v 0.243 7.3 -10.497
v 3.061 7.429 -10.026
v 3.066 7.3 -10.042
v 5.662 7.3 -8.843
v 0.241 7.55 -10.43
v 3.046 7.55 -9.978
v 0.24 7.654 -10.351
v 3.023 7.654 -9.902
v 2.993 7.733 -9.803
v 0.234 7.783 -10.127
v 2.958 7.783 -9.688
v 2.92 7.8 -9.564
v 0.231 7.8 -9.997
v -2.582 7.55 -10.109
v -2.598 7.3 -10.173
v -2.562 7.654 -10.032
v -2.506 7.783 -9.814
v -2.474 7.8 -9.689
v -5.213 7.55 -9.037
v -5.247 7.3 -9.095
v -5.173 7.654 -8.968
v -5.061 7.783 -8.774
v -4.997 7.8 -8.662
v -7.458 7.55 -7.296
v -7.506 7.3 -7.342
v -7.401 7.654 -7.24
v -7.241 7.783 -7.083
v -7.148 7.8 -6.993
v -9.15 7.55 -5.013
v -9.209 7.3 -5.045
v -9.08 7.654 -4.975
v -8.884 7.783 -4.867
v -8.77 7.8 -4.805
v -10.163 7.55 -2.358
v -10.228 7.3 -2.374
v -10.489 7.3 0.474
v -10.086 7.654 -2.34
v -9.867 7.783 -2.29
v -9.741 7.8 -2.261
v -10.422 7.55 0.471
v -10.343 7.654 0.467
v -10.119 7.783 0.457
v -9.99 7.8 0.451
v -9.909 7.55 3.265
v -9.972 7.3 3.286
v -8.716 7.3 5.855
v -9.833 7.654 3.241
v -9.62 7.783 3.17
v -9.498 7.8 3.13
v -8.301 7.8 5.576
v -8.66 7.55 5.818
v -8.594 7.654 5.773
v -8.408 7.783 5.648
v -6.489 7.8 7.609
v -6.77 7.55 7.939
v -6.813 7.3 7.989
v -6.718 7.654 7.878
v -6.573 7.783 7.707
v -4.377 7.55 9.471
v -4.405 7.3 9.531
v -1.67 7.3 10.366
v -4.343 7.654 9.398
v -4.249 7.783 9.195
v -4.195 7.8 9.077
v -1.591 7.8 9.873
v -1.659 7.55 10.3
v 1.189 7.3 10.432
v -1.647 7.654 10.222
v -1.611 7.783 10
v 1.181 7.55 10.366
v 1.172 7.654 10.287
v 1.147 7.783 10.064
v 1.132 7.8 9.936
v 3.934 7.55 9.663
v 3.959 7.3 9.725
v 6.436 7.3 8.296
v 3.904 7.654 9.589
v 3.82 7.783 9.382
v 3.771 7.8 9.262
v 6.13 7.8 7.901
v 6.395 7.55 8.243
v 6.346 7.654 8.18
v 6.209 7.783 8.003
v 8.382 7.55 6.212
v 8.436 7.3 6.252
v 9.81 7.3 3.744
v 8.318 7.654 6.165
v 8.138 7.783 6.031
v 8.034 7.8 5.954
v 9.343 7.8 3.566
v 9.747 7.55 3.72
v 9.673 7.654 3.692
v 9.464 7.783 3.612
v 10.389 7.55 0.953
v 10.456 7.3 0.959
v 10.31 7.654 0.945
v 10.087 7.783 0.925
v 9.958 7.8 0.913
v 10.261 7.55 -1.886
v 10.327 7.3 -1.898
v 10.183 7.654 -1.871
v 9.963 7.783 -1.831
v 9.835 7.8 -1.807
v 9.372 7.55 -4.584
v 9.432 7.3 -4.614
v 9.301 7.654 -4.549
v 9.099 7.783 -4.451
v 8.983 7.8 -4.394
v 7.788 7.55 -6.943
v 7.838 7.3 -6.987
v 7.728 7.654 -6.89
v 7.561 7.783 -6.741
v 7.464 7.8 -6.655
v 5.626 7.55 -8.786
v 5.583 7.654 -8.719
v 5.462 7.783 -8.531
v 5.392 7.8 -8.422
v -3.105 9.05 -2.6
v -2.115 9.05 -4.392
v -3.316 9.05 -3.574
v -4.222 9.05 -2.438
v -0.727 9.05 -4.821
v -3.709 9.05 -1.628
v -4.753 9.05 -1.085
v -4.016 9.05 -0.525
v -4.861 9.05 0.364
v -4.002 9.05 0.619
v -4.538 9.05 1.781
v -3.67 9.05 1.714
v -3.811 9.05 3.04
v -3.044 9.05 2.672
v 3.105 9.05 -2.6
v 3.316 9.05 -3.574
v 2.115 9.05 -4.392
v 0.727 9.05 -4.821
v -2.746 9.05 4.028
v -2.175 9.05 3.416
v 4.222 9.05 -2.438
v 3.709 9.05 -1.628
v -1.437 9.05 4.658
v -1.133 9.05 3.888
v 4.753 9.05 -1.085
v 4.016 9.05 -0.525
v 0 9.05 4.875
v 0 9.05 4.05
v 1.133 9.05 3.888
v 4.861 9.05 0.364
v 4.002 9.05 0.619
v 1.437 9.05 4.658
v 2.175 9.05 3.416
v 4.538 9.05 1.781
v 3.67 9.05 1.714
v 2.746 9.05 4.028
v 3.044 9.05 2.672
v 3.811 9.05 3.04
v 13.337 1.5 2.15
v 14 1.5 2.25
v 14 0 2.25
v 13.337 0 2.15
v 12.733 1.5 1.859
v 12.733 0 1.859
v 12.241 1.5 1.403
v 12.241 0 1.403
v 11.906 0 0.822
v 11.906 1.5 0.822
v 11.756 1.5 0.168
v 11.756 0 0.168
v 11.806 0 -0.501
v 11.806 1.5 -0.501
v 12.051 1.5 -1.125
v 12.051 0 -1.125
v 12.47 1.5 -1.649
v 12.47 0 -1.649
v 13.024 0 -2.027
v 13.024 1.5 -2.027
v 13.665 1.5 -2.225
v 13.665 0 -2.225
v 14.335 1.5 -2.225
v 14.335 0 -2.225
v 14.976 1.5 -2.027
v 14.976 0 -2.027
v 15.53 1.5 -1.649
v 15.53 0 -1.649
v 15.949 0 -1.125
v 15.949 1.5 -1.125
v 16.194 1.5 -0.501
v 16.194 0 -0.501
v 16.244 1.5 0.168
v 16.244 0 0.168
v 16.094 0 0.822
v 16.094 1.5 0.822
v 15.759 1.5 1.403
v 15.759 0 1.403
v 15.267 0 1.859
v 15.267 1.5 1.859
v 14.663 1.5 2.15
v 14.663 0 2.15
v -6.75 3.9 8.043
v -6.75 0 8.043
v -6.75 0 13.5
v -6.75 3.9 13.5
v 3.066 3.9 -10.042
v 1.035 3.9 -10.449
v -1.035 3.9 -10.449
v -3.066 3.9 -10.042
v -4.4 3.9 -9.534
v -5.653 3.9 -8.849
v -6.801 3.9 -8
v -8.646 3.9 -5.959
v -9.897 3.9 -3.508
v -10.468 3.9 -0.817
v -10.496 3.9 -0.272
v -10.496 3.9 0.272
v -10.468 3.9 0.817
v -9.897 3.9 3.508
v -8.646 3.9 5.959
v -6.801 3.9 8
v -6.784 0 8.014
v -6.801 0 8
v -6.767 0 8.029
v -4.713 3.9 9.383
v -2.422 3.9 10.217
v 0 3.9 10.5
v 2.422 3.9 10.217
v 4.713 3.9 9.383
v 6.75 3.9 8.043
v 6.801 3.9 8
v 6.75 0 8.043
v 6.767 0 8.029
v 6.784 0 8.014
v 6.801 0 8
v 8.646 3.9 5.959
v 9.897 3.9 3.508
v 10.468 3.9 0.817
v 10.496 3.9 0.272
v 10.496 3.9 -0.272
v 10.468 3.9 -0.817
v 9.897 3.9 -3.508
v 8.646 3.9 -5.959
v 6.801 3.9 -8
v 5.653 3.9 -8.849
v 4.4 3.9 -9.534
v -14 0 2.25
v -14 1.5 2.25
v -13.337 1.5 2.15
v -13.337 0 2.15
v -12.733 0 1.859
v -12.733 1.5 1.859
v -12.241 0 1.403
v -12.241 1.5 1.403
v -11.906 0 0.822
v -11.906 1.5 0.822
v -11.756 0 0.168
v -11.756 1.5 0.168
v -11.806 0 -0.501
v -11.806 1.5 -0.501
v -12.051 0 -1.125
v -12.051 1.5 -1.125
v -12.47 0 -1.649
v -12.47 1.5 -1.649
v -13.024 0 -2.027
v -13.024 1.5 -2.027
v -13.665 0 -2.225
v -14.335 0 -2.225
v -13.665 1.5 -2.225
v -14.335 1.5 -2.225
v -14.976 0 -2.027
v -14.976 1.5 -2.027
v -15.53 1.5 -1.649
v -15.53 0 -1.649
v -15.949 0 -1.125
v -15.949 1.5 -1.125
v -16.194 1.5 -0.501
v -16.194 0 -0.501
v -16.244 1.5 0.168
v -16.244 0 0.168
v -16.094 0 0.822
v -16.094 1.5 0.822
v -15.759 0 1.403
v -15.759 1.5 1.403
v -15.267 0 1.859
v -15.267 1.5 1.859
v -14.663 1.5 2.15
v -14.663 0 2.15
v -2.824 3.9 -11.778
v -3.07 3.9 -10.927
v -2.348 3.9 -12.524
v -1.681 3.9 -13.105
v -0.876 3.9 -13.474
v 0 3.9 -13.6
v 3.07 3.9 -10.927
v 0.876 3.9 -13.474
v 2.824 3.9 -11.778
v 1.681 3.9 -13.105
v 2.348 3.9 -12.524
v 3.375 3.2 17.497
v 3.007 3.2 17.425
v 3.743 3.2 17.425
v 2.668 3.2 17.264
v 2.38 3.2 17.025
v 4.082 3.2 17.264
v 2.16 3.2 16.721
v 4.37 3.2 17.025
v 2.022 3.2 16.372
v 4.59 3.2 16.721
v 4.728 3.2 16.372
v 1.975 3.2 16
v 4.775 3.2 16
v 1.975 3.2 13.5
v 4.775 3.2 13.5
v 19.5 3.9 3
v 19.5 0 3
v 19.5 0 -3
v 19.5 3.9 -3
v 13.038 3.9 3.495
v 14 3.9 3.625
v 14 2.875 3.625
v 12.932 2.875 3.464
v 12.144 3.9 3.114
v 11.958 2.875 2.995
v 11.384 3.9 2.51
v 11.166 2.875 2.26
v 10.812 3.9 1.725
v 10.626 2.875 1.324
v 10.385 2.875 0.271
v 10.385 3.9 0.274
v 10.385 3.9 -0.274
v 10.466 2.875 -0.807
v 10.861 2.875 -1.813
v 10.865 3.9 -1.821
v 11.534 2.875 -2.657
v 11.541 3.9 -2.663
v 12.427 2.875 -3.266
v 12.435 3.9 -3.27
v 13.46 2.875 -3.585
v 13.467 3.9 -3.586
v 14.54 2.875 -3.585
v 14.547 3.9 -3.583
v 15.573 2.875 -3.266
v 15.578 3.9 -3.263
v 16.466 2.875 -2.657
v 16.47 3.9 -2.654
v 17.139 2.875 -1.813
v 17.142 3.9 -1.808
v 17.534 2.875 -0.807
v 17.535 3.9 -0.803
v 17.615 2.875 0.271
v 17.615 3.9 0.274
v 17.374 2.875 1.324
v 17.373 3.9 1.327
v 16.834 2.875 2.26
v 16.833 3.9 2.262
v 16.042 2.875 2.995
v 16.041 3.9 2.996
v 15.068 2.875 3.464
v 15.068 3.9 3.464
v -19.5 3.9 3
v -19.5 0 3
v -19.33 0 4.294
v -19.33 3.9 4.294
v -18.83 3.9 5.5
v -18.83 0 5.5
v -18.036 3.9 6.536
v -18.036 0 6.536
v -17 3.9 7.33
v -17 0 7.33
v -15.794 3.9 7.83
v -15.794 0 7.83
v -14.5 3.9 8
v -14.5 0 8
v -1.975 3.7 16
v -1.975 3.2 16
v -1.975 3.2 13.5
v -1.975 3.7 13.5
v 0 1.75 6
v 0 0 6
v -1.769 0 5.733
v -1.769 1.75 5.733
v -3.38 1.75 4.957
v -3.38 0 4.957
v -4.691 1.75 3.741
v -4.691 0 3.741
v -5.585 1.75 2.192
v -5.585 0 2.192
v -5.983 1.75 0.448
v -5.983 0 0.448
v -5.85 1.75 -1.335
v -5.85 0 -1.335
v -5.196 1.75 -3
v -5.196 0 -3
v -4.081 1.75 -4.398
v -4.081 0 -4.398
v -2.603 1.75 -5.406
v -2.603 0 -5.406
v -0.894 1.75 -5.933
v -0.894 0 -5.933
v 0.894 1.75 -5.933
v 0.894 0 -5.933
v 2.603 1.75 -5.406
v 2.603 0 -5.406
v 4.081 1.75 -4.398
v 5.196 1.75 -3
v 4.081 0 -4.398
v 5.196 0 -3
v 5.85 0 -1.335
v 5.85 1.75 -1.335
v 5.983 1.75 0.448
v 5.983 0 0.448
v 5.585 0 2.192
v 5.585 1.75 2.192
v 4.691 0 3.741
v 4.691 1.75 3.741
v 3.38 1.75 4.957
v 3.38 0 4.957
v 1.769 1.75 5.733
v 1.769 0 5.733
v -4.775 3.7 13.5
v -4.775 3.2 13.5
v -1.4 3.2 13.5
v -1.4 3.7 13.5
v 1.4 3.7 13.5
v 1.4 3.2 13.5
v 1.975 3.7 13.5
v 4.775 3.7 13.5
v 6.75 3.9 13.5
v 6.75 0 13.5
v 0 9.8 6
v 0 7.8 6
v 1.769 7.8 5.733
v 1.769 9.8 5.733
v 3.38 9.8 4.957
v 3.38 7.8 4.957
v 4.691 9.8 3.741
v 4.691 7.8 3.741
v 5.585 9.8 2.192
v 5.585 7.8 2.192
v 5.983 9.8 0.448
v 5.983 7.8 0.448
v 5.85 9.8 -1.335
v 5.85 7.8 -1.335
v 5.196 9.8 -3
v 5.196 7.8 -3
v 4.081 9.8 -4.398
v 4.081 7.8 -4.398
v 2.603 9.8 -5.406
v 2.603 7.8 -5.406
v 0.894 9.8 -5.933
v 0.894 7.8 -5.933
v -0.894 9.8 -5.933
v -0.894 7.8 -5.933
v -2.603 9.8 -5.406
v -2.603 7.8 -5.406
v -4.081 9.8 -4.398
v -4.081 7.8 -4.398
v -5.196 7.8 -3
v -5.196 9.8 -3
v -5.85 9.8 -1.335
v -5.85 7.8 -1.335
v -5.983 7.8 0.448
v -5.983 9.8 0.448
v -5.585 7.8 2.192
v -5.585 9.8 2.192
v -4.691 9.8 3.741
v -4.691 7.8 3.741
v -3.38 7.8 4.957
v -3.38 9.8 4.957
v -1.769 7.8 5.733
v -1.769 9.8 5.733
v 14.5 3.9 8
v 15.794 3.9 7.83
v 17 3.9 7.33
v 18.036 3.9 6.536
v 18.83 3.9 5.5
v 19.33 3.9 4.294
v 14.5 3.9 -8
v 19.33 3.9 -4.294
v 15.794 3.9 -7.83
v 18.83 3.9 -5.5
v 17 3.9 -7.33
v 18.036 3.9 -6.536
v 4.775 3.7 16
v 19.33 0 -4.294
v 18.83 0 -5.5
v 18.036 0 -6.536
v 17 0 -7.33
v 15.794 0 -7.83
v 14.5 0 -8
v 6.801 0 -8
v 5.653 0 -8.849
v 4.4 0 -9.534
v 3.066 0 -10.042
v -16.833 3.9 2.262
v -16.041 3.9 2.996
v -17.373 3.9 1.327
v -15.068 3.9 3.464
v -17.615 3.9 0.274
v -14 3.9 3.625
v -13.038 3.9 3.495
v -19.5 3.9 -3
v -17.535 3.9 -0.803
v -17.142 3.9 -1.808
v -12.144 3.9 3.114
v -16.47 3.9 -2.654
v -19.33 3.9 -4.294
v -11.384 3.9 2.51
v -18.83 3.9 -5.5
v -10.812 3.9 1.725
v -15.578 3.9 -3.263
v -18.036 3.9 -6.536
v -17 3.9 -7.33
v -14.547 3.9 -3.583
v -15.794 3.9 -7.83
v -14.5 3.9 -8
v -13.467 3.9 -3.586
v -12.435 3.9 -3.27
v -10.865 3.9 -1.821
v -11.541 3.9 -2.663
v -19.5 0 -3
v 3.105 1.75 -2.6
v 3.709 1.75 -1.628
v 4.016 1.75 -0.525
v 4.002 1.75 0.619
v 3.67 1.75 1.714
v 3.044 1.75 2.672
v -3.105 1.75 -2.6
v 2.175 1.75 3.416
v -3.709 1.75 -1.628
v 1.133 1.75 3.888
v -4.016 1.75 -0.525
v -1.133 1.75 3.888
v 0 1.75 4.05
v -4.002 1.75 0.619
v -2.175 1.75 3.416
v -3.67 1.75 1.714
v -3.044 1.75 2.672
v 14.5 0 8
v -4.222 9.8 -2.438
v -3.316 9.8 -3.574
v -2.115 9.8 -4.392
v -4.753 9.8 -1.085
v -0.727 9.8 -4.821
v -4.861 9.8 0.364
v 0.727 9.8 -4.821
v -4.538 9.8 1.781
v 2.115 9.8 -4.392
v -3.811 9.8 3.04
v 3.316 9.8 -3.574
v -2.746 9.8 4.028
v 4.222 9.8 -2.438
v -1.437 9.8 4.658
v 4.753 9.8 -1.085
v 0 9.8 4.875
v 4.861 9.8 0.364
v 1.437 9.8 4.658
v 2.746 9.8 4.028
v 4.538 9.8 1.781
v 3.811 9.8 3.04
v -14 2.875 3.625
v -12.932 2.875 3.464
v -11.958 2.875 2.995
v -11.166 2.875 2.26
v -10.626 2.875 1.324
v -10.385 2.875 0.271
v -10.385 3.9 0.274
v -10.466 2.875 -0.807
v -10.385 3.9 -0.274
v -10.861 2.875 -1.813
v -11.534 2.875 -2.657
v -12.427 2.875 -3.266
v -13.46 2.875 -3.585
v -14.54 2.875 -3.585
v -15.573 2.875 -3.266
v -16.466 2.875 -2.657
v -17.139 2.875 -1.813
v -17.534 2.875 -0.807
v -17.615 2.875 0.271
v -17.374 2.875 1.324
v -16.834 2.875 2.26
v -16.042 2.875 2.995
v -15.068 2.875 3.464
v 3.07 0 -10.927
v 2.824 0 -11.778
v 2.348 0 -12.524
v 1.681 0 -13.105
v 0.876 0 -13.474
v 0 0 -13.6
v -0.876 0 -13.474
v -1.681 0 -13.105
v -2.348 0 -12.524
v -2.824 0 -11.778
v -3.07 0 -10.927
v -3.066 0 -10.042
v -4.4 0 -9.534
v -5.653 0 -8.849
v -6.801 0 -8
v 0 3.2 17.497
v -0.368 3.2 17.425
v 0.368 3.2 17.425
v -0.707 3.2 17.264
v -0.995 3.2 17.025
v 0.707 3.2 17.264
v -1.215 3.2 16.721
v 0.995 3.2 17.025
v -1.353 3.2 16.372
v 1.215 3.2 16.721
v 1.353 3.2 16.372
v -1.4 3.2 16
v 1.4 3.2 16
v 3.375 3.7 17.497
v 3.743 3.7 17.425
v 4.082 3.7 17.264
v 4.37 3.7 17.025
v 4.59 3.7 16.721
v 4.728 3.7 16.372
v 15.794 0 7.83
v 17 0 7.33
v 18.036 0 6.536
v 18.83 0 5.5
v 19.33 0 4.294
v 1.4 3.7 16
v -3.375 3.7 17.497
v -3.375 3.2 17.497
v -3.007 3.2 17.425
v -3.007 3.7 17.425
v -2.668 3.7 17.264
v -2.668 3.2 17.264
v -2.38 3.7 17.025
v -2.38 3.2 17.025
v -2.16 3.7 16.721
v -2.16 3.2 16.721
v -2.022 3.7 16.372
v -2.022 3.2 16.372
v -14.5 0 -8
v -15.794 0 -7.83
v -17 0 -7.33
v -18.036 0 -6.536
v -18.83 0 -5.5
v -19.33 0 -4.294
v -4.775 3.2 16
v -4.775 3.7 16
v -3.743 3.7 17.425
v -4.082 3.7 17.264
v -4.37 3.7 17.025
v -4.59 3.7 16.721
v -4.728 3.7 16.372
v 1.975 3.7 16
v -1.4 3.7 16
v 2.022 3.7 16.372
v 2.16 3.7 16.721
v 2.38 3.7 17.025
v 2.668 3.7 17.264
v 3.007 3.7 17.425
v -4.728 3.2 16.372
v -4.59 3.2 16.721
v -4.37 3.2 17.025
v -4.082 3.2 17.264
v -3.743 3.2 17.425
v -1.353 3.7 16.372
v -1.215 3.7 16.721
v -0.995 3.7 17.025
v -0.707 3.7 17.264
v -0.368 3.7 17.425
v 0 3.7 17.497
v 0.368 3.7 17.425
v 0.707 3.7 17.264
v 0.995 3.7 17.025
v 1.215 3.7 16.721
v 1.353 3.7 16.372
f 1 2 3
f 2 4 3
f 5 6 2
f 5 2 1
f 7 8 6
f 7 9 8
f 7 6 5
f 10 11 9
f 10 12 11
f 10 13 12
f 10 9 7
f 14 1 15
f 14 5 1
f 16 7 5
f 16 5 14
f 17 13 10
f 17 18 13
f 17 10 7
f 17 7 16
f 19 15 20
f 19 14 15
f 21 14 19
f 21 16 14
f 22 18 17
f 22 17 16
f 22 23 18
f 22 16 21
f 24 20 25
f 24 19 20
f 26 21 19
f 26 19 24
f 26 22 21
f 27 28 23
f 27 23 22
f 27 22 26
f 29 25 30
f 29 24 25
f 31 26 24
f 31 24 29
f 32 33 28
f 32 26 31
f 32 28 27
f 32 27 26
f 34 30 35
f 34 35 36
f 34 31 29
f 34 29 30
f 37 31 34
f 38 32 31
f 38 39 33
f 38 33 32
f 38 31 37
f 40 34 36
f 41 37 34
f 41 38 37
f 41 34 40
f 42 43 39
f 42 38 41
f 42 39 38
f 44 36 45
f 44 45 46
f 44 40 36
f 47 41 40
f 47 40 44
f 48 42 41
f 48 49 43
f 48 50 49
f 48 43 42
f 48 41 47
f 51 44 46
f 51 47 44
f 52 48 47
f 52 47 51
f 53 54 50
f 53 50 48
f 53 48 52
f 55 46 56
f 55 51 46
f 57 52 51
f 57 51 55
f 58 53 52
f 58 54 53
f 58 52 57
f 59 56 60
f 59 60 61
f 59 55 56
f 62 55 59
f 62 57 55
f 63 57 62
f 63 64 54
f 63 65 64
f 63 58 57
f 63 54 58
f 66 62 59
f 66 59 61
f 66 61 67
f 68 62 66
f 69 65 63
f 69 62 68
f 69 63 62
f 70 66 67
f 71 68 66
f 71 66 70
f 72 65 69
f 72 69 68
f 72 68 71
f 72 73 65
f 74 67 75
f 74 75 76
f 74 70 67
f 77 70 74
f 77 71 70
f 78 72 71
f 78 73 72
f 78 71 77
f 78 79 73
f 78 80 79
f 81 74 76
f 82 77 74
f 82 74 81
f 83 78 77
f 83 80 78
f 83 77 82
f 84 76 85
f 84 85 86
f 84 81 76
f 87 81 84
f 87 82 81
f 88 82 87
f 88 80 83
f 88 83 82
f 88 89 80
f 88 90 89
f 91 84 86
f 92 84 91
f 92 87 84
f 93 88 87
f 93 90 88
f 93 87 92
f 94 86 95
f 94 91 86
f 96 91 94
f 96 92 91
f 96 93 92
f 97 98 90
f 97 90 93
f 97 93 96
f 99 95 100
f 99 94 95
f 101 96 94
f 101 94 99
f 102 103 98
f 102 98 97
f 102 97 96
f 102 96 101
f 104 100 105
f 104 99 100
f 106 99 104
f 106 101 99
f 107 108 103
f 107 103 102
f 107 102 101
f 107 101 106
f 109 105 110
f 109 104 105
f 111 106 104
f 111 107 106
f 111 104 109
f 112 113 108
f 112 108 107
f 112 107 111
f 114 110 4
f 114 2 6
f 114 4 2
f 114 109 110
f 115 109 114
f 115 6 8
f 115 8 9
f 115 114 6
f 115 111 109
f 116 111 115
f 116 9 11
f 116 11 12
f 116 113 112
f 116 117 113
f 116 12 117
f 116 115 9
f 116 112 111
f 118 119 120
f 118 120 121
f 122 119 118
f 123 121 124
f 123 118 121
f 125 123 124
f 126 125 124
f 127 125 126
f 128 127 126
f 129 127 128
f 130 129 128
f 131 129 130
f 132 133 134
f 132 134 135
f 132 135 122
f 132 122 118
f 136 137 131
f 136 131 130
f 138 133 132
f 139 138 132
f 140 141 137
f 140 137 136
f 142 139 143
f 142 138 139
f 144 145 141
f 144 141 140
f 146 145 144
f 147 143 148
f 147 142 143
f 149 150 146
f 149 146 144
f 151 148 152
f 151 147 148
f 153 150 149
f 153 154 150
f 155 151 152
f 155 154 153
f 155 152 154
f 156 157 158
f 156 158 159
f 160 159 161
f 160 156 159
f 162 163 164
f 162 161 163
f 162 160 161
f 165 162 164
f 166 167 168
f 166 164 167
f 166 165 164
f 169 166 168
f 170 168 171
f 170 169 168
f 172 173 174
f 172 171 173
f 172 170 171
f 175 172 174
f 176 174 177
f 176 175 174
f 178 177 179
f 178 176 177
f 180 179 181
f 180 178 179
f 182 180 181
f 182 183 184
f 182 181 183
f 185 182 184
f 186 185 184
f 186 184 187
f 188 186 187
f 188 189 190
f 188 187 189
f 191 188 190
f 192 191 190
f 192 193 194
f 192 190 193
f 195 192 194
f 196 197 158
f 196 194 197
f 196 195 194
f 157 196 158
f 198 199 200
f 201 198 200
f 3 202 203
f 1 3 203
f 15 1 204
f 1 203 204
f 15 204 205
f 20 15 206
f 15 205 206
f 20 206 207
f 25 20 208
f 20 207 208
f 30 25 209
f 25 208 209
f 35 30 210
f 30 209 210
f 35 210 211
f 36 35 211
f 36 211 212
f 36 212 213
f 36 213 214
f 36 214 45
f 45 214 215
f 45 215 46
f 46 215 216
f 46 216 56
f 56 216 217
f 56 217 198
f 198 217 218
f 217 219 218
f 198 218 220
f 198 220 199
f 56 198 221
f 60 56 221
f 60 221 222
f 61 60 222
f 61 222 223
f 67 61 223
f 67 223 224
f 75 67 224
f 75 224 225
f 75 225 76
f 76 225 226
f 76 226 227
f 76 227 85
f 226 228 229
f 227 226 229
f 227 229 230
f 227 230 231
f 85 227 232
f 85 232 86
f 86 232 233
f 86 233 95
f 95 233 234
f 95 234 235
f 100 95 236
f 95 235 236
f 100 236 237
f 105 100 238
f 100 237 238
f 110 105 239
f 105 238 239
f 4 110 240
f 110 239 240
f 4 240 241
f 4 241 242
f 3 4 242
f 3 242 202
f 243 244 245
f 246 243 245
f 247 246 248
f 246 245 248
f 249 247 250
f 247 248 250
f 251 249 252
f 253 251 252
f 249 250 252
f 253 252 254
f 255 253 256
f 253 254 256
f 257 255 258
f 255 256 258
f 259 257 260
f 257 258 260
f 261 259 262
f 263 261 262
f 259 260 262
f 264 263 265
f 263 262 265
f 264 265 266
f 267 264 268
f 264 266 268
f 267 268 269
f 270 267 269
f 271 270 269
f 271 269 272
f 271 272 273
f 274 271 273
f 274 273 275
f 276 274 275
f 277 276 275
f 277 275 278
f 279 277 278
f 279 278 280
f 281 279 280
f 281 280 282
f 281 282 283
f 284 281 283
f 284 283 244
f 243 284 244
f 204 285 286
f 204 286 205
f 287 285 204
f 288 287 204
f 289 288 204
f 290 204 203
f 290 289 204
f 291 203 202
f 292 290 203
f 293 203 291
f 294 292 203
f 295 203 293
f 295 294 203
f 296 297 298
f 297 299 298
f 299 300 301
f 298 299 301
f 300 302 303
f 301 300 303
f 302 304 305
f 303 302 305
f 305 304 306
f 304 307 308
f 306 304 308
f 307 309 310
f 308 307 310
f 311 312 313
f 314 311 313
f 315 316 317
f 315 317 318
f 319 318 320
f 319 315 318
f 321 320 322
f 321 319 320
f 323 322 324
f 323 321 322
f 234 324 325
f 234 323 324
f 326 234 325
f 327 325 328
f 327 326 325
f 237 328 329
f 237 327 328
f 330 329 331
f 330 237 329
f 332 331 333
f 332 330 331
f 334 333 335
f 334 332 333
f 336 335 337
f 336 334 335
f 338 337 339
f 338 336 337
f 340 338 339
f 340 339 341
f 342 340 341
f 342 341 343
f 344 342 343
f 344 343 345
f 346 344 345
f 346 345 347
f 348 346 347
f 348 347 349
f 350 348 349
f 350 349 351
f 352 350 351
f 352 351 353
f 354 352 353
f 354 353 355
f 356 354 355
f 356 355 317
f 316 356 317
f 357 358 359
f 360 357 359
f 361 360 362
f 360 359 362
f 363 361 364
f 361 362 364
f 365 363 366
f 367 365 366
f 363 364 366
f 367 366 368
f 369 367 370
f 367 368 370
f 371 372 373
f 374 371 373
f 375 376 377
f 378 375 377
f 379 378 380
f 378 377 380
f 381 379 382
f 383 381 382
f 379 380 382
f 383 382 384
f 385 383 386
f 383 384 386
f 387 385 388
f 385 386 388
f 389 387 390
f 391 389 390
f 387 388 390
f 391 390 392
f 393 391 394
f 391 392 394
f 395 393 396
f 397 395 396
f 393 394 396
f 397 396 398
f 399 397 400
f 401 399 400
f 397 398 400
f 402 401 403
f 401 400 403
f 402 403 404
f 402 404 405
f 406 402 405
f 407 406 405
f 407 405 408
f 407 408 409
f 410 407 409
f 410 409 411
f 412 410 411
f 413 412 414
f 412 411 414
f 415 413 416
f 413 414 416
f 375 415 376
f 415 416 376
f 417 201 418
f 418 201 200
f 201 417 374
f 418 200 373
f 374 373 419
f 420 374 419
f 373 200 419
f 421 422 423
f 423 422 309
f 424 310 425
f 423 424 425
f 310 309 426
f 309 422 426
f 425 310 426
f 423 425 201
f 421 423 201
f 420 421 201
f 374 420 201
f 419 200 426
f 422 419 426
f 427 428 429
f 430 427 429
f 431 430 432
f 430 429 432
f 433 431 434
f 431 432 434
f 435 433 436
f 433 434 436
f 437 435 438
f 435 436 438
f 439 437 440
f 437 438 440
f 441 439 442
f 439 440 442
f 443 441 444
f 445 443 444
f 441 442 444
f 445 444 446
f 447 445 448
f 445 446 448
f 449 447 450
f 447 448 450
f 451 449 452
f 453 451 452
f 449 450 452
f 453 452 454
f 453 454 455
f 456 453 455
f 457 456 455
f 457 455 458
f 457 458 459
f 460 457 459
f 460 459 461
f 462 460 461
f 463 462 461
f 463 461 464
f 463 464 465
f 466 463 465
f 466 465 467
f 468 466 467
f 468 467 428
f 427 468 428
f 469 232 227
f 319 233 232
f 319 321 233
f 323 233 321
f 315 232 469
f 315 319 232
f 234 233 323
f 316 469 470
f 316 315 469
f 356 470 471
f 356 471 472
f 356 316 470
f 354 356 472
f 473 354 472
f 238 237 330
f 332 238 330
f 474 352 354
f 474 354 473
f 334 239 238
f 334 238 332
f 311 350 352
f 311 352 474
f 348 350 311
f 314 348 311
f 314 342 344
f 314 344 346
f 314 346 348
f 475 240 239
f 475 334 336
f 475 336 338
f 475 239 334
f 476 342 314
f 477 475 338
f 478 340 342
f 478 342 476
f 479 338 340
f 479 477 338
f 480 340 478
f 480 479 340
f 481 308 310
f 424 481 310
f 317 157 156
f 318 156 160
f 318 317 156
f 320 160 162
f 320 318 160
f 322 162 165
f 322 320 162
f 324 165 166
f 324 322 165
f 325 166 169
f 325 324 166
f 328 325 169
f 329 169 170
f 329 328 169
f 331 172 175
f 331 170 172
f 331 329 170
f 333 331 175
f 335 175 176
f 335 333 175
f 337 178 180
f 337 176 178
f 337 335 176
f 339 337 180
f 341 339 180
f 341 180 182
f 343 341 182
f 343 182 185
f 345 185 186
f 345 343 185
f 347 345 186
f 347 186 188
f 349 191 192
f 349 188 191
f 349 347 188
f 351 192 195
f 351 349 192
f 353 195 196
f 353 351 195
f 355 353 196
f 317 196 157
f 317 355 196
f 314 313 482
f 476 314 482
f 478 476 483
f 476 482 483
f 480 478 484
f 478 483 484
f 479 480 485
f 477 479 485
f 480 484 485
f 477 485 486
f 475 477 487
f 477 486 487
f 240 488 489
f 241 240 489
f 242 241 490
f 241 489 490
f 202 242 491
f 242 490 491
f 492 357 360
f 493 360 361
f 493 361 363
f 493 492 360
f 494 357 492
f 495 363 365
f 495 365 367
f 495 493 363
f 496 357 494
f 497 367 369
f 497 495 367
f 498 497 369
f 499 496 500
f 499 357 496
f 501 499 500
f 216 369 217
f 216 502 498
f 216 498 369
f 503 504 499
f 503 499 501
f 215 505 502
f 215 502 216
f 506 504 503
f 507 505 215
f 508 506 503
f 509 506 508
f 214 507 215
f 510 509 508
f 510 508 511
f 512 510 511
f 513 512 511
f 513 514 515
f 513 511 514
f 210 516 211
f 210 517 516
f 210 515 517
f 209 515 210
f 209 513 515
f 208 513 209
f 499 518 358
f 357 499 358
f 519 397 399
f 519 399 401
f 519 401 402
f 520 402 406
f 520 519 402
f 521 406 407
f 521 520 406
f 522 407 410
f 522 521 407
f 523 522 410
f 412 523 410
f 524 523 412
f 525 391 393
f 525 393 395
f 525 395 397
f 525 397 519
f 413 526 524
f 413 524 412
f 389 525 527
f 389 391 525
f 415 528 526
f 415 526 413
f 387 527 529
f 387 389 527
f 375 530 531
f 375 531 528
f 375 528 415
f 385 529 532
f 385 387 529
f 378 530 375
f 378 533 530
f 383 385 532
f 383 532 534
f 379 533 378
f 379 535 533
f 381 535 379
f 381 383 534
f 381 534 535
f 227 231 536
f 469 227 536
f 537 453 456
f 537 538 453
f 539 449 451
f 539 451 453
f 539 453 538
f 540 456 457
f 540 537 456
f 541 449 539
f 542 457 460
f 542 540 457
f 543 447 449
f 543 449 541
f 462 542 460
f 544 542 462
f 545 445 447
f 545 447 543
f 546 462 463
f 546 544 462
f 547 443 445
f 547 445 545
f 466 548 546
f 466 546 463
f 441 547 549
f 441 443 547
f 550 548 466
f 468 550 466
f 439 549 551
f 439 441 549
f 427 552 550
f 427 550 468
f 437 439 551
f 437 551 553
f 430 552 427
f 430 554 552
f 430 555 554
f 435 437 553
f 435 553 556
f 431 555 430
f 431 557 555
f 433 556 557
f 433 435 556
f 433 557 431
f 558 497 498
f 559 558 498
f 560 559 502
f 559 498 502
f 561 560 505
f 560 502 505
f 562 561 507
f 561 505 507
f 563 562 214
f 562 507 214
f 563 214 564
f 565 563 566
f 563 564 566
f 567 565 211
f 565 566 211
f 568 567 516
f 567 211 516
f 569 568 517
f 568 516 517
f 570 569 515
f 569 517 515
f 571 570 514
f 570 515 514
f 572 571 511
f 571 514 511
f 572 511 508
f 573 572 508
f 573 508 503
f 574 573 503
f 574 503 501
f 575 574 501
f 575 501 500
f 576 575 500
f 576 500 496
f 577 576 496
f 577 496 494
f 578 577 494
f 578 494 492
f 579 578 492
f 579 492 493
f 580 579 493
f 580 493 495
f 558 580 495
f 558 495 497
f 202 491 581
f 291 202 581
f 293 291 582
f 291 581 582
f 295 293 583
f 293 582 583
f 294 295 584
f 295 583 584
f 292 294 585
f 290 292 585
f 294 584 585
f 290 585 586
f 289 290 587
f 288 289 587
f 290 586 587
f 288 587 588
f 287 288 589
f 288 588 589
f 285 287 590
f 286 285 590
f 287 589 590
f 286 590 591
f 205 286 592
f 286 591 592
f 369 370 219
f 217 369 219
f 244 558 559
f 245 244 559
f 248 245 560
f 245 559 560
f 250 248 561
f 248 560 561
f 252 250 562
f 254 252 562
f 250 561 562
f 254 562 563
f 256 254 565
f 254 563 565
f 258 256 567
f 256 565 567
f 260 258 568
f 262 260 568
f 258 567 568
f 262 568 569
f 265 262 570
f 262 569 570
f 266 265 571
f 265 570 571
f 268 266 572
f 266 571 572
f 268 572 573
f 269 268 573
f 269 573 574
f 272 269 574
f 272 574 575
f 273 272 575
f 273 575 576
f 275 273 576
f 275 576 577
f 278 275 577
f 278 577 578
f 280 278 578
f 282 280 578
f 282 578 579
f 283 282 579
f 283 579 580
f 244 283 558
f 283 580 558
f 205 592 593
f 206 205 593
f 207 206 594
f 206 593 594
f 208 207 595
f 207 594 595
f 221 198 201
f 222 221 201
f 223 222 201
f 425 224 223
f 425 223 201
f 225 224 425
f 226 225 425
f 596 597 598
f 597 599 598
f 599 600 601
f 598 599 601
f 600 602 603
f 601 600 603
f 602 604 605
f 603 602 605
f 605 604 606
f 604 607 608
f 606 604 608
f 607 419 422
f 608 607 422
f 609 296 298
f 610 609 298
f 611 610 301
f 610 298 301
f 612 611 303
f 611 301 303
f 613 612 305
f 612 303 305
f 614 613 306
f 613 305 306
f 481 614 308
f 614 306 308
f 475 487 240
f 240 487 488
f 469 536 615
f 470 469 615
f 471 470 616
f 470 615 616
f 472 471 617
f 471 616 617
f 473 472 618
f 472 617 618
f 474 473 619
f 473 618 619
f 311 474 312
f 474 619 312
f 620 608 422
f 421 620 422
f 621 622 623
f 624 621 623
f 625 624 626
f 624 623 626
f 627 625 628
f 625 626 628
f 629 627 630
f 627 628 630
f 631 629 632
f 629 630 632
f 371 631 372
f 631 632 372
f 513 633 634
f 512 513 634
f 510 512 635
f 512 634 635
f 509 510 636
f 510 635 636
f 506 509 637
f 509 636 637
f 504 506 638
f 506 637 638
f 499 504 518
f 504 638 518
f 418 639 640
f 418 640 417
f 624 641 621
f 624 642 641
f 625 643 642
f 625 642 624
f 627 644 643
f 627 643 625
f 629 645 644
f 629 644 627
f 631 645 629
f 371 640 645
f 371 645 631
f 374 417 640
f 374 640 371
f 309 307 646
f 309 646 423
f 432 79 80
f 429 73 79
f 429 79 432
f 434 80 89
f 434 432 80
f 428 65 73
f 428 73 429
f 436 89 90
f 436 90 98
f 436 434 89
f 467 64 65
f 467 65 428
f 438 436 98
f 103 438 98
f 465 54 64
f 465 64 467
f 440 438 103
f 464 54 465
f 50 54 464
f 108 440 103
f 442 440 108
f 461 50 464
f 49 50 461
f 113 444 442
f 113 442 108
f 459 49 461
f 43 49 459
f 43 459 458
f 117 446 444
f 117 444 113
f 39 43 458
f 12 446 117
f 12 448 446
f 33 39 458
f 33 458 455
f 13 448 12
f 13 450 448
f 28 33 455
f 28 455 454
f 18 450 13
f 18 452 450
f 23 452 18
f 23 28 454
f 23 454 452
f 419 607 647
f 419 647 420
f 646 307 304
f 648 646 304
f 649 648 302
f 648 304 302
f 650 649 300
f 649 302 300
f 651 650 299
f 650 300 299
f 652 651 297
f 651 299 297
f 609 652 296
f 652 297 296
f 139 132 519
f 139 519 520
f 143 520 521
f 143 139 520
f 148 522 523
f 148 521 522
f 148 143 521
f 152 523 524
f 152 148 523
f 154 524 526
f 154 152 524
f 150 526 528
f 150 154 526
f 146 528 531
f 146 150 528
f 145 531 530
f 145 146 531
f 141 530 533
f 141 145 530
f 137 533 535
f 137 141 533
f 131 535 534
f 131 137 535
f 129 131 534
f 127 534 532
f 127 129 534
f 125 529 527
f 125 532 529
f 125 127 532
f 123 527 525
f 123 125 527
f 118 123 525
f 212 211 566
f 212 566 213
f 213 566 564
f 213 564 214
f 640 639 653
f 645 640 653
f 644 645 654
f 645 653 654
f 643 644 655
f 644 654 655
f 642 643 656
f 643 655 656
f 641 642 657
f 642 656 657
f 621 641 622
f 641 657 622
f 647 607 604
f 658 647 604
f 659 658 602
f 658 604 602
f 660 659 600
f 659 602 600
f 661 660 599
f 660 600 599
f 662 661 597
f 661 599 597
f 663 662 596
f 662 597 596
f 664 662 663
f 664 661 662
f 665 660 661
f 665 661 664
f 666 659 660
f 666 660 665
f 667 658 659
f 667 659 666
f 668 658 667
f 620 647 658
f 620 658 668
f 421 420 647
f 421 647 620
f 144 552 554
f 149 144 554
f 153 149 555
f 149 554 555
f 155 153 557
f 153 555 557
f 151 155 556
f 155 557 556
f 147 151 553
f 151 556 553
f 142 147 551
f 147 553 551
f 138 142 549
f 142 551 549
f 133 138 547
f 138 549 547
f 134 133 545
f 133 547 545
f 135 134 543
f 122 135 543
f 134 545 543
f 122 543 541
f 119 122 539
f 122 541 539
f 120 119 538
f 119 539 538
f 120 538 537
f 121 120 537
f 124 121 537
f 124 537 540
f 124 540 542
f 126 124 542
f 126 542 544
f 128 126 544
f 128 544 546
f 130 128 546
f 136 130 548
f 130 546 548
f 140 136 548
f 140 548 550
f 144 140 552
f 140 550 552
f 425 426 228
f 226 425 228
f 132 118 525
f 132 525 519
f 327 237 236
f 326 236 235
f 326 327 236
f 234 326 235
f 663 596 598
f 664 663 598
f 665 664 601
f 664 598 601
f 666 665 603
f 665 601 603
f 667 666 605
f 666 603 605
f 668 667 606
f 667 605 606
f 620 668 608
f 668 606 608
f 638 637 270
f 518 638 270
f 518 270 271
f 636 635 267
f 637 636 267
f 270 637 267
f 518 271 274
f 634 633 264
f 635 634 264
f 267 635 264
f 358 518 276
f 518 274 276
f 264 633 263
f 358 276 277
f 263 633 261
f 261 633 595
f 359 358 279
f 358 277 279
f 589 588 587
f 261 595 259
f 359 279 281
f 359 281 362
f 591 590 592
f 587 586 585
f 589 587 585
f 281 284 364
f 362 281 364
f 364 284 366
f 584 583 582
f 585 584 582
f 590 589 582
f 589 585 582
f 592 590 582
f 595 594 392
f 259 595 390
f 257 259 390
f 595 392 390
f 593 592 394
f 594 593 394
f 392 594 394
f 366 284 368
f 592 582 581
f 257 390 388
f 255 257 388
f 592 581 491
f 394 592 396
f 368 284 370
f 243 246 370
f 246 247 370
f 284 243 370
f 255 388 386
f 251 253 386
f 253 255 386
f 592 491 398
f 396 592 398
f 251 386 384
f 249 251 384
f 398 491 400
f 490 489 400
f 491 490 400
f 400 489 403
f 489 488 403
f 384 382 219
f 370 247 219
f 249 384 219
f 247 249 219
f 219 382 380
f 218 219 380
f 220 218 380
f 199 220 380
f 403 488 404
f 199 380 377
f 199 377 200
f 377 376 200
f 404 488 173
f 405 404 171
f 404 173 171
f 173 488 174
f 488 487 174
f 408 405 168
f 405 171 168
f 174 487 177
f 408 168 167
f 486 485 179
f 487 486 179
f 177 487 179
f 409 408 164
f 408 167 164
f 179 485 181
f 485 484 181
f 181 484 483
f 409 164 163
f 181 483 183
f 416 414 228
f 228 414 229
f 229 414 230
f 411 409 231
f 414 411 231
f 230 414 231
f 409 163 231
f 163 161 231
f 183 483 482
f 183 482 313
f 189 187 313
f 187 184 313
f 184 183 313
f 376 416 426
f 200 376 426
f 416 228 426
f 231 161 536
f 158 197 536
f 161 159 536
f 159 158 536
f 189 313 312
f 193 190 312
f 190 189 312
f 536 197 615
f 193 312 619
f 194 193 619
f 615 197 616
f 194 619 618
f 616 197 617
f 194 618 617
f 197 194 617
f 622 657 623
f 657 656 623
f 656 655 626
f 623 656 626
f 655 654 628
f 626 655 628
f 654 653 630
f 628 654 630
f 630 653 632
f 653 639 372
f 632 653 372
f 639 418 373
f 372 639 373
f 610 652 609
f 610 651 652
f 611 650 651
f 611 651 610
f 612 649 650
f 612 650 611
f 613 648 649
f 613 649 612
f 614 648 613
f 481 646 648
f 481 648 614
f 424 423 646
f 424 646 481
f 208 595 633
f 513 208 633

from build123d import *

# Parameters (mm, degrees)
BOSS_EXTRUDE1_DEPTH = 3.9
SKETCH3_R           = 2.25
CUT_EXTRUDE1_DEPTH  = 25.091907
BOSS_EXTRUDE3_START = -3.9
SKETCH6_R           = 10.5
BOSS_EXTRUDE3_DEPTH = 7.8
SKETCH4_R           = 3.625
CUT_EXTRUDE2_DEPTH  = 2.4
BOSS_EXTRUDE4_START = -7.8
SKETCH7_R           = 6
BOSS_EXTRUDE4_DEPTH = 9.8
SKETCH8_R           = 4.875
CUT_EXTRUDE3_DEPTH  = 0.75
CUT_EXTRUDE4_DEPTH  = 26.438406
SKETCH10_R          = 6
CUT_EXTRUDE5_DEPTH  = 1.75
BOSS_EXTRUDE5_START = 3.2
SKETCH11_W          = 2.8
SKETCH11_H          = 4
BOSS_EXTRUDE5_DEPTH = 0.5
FILLET1_R           = 1.5
FILLET2_R           = 0.5


with BuildPart() as part:
    # Sketch2 → Boss-Extrude1 (new body)
    with BuildSketch(Plane(origin=(0, 0, 0), x_dir=(1, 0, 0), z_dir=(0, 1, 0))):
        with BuildLine():
            Line((-19.5, 3), (-19.5, -3))
            ThreePointArc((-19.5, -3), (-18.035534, -6.535534), (-14.5, -8))
            Line((-14.5, -8), (-6.75, -8))
            Line((-6.75, -8), (-6.75, -13.5))
            Line((-6.75, -13.5), (6.75, -13.5))
            Line((6.75, -13.5), (6.75, -8))
            Line((6.75, -8), (14.5, -8))
            ThreePointArc((14.5, -8), (18.035534, -6.535534), (19.5, -3))
            Line((19.5, -3), (19.5, 3))
            ThreePointArc((19.5, 3), (18.035534, 6.535534), (14.5, 8))
            Line((14.5, 8), (6.800735, 8))
            ThreePointArc((6.800735, 8), (5.037969, 9.21243), (3.066037, 10.042381))
            ThreePointArc((3.066037, 10.042381), (0, 13.6), (-3.066037, 10.042381))
            ThreePointArc((-3.066037, 10.042381), (-5.037969, 9.21243), (-6.800735, 8))
            Line((-6.800735, 8), (-14.5, 8))
            ThreePointArc((-14.5, 8), (-18.035534, 6.535534), (-19.5, 3))
        make_face()
    extrude(amount=BOSS_EXTRUDE1_DEPTH)

    # Sketch3 → Cut-Extrude1 (cut, through all)
    with BuildSketch(Plane(origin=(0, 3.9, 0), x_dir=(1, 0, 0), z_dir=(0, 1, 0))):
        with Locations(Location((-14, 0, 0), (0, 0, 270))):
            Circle(SKETCH3_R)
    cut_extrude1 = extrude(amount=-CUT_EXTRUDE1_DEPTH, mode=Mode.SUBTRACT)

    # Sketch6 → Boss-Extrude3 (add)
    with BuildSketch(Plane(origin=(0, 3.9, 0), x_dir=(1, 0, 0), z_dir=(0, 1, 0)).offset(BOSS_EXTRUDE3_START)):
        with Locations(Location((0, 0, 0), (0, 0, 73.022056))):
            Circle(SKETCH6_R)
    extrude(amount=BOSS_EXTRUDE3_DEPTH)

    # Sketch4 → Cut-Extrude2 (cut)
    with BuildSketch(Plane(origin=(0, 3.9, 0), x_dir=(1, 0, 0), z_dir=(0, 1, 0))):
        with Locations(Location((-14, 0, 0), (0, 0, 270))):
            Circle(SKETCH4_R)
    cut_extrude2 = extrude(amount=-CUT_EXTRUDE2_DEPTH, mode=Mode.SUBTRACT)

    # Sketch5 → Revolve1 (revolve)
    with BuildSketch(Plane.XY, mode=Mode.PRIVATE) as revolve1_sk:
        Polygon((-16.25, 1.5), (-17.625, 2.875), (-17.625, 1.5), align=None)
    revolve1 = revolve(revolve1_sk.sketch.rotate(Axis((-14, -999.202494, 0), (0, 1, 0)), 90), axis=Axis((-14, -999.202494, 0), (0, 1, 0)))

    # Mirror1: Cut-Extrude1, Cut-Extrude2, Revolve1 across plane
    add(cut_extrude1.mirror(Plane(origin=(0, 0, 0), x_dir=(0, 0, 1), z_dir=(1, 0, 0))), mode=Mode.SUBTRACT)
    add(cut_extrude2.mirror(Plane(origin=(0, 0, 0), x_dir=(0, 0, 1), z_dir=(1, 0, 0))), mode=Mode.SUBTRACT)
    add(revolve1.mirror(Plane(origin=(0, 0, 0), x_dir=(0, 0, 1), z_dir=(1, 0, 0))))

    # Sketch7 → Boss-Extrude4 (add)
    with BuildSketch(Plane(origin=(0, 7.8, 0), x_dir=(1, 0, 0), z_dir=(0, 1, 0)).offset(BOSS_EXTRUDE4_START)):
        with Locations(Location((0, 0, 0), (0, 0, 270))):
            Circle(SKETCH7_R)
    extrude(amount=BOSS_EXTRUDE4_DEPTH)

    # Sketch8 → Cut-Extrude3 (cut)
    with BuildSketch(Plane(origin=(0, 9.8, 0), x_dir=(1, 0, 0), z_dir=(0, 1, 0))):
        with Locations(Location((0, 0, 0), (0, 0, 270))):
            Circle(SKETCH8_R)
    extrude(amount=-CUT_EXTRUDE3_DEPTH, mode=Mode.SUBTRACT)

    # Sketch9 → Cut-Extrude4 (cut, through all)
    with BuildSketch(Plane(origin=(0, 9.05, 0), x_dir=(1, 0, 0), z_dir=(0, 1, 0))):
        with BuildLine():
            Line((-3.105238, 2.6), (3.105238, 2.6))
            ThreePointArc((3.105238, 2.6), (0, -4.05), (-3.105238, 2.6))
        make_face()
    extrude(amount=-CUT_EXTRUDE4_DEPTH, mode=Mode.SUBTRACT)

    # Sketch10 → Cut-Extrude5 (cut)
    with BuildSketch(Plane.XZ):
        with Locations(Location((0, 0, 0), (0, 0, 90))):
            Circle(SKETCH10_R)
    extrude(amount=-CUT_EXTRUDE5_DEPTH, mode=Mode.SUBTRACT)

    # Sketch11 → Boss-Extrude5 (add)
    with BuildSketch(Plane(origin=(0, 0, 0), x_dir=(1, 0, 0), z_dir=(0, 1, 0)).offset(BOSS_EXTRUDE5_START)):
        with Locations((-3.375, -15.5)):
            Rectangle(SKETCH11_W, SKETCH11_H)
        with Locations((0, -15.5)):
            Rectangle(SKETCH11_W, SKETCH11_H)
        with Locations((3.375, -15.5)):
            Rectangle(SKETCH11_W, SKETCH11_H)
    extrude(amount=BOSS_EXTRUDE5_DEPTH)

    # Fillet1
    # the kernel refuses this fillet: 1.5 mm, written as the material it takes off along each edge
    with BuildSketch(Plane(origin=(-4.775, -0.55, 17.5), x_dir=(0, 0, -1), z_dir=(0, 1, 0)), Plane(origin=(-1.4, -0.55, 17.5), x_dir=(0, 0, -1), z_dir=(0, 1, 0)), Plane(origin=(1.975, -0.55, 17.5), x_dir=(0, 0, -1), z_dir=(0, 1, 0))) as fillet1_piece_1:
        with BuildLine():
            CenterArc((FILLET1_R, -FILLET1_R), FILLET1_R, 90, 90)
            Line((0, -FILLET1_R), (0, 0))
            Line((0, 0), (FILLET1_R, 0))
        make_face()
    extrude(amount=8, mode=Mode.SUBTRACT)
    with BuildSketch(Plane(origin=(-1.975, -0.55, 17.5), x_dir=(0, 0, -1), z_dir=(0, 1, 0)), Plane(origin=(1.4, -0.55, 17.5), x_dir=(0, 0, -1), z_dir=(0, 1, 0)), Plane(origin=(4.775, -0.55, 17.5), x_dir=(0, 0, -1), z_dir=(0, 1, 0))) as fillet1_piece_2:
        with BuildLine():
            CenterArc((FILLET1_R, FILLET1_R), FILLET1_R, 180, 90)
            Line((0, FILLET1_R), (0, 0))
            Line((0, 0), (FILLET1_R, 0))
        make_face()
    extrude(amount=8, mode=Mode.SUBTRACT)

    # Fillet2
    fillet2_edges = [part.edges().sort_by_distance(p)[0] for p in [
        (-3.066037, 7.8, 10.042381),
    ]]
    fillet(fillet2_edges, radius=FILLET2_R)


solid = part.part
